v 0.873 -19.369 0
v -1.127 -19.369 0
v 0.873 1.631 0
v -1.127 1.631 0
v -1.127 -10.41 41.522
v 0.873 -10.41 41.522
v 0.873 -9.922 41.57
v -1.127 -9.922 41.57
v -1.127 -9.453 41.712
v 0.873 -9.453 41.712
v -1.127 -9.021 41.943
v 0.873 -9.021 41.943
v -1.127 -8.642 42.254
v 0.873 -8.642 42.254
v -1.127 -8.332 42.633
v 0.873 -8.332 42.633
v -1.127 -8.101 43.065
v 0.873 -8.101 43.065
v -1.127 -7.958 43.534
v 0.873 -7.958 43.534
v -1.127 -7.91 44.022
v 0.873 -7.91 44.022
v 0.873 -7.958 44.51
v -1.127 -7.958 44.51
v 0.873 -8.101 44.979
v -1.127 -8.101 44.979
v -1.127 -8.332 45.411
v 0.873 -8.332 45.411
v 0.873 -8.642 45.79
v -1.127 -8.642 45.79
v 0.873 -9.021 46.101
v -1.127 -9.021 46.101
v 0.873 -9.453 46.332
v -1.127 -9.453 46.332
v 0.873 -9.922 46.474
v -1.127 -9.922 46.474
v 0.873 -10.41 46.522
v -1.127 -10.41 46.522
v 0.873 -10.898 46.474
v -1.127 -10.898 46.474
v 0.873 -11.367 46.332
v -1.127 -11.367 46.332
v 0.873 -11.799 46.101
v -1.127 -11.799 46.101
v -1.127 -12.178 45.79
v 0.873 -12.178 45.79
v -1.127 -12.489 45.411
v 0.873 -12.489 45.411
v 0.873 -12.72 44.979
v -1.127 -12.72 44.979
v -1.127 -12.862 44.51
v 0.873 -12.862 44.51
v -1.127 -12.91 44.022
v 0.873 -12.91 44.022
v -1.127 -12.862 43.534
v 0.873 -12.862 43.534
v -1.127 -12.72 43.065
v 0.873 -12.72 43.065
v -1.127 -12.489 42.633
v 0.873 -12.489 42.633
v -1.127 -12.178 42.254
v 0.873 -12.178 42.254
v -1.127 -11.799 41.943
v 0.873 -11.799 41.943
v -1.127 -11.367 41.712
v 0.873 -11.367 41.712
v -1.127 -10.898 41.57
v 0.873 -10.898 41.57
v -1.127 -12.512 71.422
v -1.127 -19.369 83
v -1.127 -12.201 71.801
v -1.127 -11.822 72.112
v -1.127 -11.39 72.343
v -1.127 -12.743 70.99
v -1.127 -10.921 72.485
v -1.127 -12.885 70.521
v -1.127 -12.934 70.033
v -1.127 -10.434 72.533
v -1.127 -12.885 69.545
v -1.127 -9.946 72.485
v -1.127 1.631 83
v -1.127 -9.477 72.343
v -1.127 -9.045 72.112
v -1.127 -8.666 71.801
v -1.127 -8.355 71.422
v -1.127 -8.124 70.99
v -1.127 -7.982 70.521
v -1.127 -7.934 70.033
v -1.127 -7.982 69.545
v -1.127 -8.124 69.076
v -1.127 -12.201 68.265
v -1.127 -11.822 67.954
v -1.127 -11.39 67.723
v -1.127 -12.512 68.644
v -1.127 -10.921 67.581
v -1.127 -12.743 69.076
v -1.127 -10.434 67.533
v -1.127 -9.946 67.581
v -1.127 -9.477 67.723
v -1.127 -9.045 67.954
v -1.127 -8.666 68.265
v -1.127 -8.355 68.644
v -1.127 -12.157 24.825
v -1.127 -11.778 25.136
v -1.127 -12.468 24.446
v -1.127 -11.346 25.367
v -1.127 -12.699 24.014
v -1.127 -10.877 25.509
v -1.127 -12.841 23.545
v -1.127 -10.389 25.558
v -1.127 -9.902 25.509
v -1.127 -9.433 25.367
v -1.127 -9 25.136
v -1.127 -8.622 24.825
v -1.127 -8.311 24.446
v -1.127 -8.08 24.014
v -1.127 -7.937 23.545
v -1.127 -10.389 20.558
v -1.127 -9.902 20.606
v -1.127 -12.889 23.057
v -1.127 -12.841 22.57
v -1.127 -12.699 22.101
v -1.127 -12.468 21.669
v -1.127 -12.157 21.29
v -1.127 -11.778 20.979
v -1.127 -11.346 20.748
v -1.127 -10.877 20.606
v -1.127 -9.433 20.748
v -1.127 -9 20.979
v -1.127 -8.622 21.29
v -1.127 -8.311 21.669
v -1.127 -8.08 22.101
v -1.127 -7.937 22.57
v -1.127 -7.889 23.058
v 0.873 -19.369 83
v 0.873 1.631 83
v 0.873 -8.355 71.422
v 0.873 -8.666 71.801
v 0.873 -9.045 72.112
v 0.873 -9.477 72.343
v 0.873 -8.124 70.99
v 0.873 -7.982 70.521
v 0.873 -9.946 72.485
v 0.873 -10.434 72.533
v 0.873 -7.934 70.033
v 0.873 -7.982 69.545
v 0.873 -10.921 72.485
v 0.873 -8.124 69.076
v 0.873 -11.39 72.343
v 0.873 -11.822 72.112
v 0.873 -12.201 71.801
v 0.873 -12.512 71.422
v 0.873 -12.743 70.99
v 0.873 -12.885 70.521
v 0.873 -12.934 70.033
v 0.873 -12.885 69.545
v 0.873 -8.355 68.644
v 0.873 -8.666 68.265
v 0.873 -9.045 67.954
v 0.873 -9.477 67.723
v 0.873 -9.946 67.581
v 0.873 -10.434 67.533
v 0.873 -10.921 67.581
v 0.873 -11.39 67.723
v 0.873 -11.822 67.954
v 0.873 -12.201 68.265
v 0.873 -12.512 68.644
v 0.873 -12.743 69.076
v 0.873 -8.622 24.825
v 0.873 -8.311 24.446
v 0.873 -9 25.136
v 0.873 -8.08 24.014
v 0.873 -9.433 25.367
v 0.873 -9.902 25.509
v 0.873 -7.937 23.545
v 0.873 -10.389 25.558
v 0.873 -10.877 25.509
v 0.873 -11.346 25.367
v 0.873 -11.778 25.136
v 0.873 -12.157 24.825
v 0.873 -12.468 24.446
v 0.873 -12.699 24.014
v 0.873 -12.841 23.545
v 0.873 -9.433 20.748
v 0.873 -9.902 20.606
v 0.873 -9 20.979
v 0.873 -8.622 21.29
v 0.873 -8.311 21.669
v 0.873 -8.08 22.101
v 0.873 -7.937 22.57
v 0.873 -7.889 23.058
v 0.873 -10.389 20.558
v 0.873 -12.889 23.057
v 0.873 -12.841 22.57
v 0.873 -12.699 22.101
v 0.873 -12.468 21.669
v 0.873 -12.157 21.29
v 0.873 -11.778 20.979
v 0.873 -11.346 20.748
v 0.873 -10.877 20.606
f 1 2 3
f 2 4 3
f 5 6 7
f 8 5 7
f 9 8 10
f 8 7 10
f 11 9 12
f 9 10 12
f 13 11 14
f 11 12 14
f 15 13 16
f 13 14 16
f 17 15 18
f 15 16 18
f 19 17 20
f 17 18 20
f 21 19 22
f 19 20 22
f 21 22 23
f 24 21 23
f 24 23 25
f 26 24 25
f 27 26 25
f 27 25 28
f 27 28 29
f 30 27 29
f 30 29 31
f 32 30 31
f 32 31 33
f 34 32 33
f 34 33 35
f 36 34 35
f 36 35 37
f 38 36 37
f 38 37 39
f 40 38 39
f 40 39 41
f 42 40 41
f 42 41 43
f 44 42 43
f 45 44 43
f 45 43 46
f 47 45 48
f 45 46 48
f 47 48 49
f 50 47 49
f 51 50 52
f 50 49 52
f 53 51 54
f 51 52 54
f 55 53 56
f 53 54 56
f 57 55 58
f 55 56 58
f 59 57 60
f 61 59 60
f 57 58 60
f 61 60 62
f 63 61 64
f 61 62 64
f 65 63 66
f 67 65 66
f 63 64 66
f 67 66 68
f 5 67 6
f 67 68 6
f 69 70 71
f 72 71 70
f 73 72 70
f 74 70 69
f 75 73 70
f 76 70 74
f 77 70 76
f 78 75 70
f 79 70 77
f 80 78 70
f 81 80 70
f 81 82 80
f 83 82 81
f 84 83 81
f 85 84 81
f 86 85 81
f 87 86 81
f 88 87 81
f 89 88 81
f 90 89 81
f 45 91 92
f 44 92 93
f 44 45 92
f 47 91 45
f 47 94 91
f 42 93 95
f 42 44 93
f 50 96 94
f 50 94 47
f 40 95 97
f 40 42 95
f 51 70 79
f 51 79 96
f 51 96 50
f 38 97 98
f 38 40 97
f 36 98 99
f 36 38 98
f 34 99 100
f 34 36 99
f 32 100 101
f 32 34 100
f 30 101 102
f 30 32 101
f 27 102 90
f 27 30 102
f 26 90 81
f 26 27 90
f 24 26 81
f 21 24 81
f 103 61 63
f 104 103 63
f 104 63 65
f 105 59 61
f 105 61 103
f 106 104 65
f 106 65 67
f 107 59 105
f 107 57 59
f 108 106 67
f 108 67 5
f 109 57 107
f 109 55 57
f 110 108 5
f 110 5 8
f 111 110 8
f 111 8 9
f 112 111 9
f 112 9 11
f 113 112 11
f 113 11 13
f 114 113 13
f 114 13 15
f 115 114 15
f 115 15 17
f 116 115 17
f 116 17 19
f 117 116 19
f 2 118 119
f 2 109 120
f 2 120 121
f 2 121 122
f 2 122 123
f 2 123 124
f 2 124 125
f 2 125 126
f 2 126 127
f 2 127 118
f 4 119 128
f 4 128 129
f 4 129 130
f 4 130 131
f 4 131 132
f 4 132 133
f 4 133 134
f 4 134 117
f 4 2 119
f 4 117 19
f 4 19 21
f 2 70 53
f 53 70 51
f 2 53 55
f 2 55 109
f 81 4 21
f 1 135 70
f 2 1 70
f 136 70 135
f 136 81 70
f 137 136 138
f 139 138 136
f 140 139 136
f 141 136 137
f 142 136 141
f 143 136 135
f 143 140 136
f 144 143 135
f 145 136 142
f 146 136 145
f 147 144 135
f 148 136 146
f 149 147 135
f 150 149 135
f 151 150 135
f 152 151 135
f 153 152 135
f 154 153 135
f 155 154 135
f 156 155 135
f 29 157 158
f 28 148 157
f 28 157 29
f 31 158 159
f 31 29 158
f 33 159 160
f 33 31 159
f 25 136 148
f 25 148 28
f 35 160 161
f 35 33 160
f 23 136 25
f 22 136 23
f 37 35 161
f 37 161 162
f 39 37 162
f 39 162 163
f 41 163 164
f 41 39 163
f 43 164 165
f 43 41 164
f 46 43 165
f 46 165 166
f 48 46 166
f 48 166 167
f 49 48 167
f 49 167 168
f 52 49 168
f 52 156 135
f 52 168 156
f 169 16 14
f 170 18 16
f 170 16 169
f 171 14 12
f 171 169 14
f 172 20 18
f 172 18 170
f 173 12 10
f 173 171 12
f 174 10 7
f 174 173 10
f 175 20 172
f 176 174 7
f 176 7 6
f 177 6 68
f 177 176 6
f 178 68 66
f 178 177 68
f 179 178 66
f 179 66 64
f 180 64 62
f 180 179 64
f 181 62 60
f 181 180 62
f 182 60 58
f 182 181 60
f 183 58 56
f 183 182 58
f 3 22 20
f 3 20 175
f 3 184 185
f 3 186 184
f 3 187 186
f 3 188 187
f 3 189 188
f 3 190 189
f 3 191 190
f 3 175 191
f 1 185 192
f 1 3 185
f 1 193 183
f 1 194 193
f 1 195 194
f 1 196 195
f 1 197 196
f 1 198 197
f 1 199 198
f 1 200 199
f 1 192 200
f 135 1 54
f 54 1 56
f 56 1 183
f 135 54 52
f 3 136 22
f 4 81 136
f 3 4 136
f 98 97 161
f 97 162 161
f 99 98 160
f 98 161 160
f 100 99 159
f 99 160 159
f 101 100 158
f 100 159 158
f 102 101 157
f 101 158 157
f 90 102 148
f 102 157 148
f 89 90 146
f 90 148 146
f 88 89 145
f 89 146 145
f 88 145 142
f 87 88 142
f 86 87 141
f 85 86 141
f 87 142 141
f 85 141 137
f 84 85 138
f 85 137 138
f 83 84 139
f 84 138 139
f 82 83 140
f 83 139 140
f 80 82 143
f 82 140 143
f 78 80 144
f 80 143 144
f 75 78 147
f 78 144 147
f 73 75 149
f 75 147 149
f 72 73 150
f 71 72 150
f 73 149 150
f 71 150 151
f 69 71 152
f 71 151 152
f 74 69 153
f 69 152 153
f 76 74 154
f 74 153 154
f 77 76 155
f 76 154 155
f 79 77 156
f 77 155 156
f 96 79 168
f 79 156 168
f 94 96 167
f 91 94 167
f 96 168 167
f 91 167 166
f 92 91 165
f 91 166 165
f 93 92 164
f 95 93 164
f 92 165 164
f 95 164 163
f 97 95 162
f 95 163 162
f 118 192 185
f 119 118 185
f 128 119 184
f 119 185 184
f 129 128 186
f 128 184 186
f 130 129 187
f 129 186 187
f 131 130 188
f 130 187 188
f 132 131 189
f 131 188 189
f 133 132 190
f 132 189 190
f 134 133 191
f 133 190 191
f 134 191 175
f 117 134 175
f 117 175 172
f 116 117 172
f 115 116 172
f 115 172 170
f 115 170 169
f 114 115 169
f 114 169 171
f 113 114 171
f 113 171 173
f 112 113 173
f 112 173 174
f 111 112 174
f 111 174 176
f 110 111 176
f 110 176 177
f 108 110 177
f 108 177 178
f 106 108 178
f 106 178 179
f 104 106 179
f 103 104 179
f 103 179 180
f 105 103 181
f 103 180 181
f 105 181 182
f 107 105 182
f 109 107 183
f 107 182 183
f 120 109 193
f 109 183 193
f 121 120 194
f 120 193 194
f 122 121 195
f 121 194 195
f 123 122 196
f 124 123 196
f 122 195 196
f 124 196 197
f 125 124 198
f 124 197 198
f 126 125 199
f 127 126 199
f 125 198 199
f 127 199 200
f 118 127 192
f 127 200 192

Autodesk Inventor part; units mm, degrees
ref_plane "YZ Plane" through (0, 0, 0) normal (1, 0, 0) x (0, 1, 0)
ref_plane "XZ Plane" through (0, 0, 0) normal (0, 1, 0) x (-1, 0, 0)
ref_plane "XY Plane" through (0, 0, 0) normal (0, 0, 1) x (1, 0, 0)
sketch "Sketch1" plane through (0, 0, 0) normal (0, 0, 1) x (1, 0, 0)
  line L0 (-1.1274, 1.6306) -> (0.8726, 1.6306)
  line L1 (0.8726, 1.6306) -> (0.8726, -19.3694)
  line L2 (0.8726, -19.3694) -> (-1.1274, -19.3694)
  line L3 (-1.1274, -19.3694) -> (-1.1274, 1.6306)
  point P0 (0, 0)
  dimension "d0" = 2
  dimension "d1" = 21
extrude "Extrusion1" add sketch "Sketch1" along normal blind 83
sketch "Sketch2" plane through (0.8726, -19.3694, 0) normal (1, 0, 0) x (0, 0, -1)
  circle A0 centre (-23.0575, 8.9801) radius 2.5 projected
  circle A1 centre (-23.0575, 8.9801) radius 2.5 projected
  circle A2 centre (-23.0575, 8.9801) radius 2.5 projected
  circle A3 centre (-44.0219, 8.9592) radius 2.5 projected
  circle A4 centre (-44.0219, 8.9592) radius 2.5 projected
  circle A5 centre (-44.0219, 8.9592) radius 2.5 projected
  circle A6 centre (-44.0219, 8.9592) radius 2.5 projected
  circle A7 centre (-44.0219, 8.9592) radius 2.5 projected
  circle A8 centre (-70.0331, 8.9359) radius 2.5 projected
  point P0 (0, 19.3694)
extrude "Extrusion2" cut sketch "Sketch2" against normal blind 10
properties part number "Gear wall motor side"
